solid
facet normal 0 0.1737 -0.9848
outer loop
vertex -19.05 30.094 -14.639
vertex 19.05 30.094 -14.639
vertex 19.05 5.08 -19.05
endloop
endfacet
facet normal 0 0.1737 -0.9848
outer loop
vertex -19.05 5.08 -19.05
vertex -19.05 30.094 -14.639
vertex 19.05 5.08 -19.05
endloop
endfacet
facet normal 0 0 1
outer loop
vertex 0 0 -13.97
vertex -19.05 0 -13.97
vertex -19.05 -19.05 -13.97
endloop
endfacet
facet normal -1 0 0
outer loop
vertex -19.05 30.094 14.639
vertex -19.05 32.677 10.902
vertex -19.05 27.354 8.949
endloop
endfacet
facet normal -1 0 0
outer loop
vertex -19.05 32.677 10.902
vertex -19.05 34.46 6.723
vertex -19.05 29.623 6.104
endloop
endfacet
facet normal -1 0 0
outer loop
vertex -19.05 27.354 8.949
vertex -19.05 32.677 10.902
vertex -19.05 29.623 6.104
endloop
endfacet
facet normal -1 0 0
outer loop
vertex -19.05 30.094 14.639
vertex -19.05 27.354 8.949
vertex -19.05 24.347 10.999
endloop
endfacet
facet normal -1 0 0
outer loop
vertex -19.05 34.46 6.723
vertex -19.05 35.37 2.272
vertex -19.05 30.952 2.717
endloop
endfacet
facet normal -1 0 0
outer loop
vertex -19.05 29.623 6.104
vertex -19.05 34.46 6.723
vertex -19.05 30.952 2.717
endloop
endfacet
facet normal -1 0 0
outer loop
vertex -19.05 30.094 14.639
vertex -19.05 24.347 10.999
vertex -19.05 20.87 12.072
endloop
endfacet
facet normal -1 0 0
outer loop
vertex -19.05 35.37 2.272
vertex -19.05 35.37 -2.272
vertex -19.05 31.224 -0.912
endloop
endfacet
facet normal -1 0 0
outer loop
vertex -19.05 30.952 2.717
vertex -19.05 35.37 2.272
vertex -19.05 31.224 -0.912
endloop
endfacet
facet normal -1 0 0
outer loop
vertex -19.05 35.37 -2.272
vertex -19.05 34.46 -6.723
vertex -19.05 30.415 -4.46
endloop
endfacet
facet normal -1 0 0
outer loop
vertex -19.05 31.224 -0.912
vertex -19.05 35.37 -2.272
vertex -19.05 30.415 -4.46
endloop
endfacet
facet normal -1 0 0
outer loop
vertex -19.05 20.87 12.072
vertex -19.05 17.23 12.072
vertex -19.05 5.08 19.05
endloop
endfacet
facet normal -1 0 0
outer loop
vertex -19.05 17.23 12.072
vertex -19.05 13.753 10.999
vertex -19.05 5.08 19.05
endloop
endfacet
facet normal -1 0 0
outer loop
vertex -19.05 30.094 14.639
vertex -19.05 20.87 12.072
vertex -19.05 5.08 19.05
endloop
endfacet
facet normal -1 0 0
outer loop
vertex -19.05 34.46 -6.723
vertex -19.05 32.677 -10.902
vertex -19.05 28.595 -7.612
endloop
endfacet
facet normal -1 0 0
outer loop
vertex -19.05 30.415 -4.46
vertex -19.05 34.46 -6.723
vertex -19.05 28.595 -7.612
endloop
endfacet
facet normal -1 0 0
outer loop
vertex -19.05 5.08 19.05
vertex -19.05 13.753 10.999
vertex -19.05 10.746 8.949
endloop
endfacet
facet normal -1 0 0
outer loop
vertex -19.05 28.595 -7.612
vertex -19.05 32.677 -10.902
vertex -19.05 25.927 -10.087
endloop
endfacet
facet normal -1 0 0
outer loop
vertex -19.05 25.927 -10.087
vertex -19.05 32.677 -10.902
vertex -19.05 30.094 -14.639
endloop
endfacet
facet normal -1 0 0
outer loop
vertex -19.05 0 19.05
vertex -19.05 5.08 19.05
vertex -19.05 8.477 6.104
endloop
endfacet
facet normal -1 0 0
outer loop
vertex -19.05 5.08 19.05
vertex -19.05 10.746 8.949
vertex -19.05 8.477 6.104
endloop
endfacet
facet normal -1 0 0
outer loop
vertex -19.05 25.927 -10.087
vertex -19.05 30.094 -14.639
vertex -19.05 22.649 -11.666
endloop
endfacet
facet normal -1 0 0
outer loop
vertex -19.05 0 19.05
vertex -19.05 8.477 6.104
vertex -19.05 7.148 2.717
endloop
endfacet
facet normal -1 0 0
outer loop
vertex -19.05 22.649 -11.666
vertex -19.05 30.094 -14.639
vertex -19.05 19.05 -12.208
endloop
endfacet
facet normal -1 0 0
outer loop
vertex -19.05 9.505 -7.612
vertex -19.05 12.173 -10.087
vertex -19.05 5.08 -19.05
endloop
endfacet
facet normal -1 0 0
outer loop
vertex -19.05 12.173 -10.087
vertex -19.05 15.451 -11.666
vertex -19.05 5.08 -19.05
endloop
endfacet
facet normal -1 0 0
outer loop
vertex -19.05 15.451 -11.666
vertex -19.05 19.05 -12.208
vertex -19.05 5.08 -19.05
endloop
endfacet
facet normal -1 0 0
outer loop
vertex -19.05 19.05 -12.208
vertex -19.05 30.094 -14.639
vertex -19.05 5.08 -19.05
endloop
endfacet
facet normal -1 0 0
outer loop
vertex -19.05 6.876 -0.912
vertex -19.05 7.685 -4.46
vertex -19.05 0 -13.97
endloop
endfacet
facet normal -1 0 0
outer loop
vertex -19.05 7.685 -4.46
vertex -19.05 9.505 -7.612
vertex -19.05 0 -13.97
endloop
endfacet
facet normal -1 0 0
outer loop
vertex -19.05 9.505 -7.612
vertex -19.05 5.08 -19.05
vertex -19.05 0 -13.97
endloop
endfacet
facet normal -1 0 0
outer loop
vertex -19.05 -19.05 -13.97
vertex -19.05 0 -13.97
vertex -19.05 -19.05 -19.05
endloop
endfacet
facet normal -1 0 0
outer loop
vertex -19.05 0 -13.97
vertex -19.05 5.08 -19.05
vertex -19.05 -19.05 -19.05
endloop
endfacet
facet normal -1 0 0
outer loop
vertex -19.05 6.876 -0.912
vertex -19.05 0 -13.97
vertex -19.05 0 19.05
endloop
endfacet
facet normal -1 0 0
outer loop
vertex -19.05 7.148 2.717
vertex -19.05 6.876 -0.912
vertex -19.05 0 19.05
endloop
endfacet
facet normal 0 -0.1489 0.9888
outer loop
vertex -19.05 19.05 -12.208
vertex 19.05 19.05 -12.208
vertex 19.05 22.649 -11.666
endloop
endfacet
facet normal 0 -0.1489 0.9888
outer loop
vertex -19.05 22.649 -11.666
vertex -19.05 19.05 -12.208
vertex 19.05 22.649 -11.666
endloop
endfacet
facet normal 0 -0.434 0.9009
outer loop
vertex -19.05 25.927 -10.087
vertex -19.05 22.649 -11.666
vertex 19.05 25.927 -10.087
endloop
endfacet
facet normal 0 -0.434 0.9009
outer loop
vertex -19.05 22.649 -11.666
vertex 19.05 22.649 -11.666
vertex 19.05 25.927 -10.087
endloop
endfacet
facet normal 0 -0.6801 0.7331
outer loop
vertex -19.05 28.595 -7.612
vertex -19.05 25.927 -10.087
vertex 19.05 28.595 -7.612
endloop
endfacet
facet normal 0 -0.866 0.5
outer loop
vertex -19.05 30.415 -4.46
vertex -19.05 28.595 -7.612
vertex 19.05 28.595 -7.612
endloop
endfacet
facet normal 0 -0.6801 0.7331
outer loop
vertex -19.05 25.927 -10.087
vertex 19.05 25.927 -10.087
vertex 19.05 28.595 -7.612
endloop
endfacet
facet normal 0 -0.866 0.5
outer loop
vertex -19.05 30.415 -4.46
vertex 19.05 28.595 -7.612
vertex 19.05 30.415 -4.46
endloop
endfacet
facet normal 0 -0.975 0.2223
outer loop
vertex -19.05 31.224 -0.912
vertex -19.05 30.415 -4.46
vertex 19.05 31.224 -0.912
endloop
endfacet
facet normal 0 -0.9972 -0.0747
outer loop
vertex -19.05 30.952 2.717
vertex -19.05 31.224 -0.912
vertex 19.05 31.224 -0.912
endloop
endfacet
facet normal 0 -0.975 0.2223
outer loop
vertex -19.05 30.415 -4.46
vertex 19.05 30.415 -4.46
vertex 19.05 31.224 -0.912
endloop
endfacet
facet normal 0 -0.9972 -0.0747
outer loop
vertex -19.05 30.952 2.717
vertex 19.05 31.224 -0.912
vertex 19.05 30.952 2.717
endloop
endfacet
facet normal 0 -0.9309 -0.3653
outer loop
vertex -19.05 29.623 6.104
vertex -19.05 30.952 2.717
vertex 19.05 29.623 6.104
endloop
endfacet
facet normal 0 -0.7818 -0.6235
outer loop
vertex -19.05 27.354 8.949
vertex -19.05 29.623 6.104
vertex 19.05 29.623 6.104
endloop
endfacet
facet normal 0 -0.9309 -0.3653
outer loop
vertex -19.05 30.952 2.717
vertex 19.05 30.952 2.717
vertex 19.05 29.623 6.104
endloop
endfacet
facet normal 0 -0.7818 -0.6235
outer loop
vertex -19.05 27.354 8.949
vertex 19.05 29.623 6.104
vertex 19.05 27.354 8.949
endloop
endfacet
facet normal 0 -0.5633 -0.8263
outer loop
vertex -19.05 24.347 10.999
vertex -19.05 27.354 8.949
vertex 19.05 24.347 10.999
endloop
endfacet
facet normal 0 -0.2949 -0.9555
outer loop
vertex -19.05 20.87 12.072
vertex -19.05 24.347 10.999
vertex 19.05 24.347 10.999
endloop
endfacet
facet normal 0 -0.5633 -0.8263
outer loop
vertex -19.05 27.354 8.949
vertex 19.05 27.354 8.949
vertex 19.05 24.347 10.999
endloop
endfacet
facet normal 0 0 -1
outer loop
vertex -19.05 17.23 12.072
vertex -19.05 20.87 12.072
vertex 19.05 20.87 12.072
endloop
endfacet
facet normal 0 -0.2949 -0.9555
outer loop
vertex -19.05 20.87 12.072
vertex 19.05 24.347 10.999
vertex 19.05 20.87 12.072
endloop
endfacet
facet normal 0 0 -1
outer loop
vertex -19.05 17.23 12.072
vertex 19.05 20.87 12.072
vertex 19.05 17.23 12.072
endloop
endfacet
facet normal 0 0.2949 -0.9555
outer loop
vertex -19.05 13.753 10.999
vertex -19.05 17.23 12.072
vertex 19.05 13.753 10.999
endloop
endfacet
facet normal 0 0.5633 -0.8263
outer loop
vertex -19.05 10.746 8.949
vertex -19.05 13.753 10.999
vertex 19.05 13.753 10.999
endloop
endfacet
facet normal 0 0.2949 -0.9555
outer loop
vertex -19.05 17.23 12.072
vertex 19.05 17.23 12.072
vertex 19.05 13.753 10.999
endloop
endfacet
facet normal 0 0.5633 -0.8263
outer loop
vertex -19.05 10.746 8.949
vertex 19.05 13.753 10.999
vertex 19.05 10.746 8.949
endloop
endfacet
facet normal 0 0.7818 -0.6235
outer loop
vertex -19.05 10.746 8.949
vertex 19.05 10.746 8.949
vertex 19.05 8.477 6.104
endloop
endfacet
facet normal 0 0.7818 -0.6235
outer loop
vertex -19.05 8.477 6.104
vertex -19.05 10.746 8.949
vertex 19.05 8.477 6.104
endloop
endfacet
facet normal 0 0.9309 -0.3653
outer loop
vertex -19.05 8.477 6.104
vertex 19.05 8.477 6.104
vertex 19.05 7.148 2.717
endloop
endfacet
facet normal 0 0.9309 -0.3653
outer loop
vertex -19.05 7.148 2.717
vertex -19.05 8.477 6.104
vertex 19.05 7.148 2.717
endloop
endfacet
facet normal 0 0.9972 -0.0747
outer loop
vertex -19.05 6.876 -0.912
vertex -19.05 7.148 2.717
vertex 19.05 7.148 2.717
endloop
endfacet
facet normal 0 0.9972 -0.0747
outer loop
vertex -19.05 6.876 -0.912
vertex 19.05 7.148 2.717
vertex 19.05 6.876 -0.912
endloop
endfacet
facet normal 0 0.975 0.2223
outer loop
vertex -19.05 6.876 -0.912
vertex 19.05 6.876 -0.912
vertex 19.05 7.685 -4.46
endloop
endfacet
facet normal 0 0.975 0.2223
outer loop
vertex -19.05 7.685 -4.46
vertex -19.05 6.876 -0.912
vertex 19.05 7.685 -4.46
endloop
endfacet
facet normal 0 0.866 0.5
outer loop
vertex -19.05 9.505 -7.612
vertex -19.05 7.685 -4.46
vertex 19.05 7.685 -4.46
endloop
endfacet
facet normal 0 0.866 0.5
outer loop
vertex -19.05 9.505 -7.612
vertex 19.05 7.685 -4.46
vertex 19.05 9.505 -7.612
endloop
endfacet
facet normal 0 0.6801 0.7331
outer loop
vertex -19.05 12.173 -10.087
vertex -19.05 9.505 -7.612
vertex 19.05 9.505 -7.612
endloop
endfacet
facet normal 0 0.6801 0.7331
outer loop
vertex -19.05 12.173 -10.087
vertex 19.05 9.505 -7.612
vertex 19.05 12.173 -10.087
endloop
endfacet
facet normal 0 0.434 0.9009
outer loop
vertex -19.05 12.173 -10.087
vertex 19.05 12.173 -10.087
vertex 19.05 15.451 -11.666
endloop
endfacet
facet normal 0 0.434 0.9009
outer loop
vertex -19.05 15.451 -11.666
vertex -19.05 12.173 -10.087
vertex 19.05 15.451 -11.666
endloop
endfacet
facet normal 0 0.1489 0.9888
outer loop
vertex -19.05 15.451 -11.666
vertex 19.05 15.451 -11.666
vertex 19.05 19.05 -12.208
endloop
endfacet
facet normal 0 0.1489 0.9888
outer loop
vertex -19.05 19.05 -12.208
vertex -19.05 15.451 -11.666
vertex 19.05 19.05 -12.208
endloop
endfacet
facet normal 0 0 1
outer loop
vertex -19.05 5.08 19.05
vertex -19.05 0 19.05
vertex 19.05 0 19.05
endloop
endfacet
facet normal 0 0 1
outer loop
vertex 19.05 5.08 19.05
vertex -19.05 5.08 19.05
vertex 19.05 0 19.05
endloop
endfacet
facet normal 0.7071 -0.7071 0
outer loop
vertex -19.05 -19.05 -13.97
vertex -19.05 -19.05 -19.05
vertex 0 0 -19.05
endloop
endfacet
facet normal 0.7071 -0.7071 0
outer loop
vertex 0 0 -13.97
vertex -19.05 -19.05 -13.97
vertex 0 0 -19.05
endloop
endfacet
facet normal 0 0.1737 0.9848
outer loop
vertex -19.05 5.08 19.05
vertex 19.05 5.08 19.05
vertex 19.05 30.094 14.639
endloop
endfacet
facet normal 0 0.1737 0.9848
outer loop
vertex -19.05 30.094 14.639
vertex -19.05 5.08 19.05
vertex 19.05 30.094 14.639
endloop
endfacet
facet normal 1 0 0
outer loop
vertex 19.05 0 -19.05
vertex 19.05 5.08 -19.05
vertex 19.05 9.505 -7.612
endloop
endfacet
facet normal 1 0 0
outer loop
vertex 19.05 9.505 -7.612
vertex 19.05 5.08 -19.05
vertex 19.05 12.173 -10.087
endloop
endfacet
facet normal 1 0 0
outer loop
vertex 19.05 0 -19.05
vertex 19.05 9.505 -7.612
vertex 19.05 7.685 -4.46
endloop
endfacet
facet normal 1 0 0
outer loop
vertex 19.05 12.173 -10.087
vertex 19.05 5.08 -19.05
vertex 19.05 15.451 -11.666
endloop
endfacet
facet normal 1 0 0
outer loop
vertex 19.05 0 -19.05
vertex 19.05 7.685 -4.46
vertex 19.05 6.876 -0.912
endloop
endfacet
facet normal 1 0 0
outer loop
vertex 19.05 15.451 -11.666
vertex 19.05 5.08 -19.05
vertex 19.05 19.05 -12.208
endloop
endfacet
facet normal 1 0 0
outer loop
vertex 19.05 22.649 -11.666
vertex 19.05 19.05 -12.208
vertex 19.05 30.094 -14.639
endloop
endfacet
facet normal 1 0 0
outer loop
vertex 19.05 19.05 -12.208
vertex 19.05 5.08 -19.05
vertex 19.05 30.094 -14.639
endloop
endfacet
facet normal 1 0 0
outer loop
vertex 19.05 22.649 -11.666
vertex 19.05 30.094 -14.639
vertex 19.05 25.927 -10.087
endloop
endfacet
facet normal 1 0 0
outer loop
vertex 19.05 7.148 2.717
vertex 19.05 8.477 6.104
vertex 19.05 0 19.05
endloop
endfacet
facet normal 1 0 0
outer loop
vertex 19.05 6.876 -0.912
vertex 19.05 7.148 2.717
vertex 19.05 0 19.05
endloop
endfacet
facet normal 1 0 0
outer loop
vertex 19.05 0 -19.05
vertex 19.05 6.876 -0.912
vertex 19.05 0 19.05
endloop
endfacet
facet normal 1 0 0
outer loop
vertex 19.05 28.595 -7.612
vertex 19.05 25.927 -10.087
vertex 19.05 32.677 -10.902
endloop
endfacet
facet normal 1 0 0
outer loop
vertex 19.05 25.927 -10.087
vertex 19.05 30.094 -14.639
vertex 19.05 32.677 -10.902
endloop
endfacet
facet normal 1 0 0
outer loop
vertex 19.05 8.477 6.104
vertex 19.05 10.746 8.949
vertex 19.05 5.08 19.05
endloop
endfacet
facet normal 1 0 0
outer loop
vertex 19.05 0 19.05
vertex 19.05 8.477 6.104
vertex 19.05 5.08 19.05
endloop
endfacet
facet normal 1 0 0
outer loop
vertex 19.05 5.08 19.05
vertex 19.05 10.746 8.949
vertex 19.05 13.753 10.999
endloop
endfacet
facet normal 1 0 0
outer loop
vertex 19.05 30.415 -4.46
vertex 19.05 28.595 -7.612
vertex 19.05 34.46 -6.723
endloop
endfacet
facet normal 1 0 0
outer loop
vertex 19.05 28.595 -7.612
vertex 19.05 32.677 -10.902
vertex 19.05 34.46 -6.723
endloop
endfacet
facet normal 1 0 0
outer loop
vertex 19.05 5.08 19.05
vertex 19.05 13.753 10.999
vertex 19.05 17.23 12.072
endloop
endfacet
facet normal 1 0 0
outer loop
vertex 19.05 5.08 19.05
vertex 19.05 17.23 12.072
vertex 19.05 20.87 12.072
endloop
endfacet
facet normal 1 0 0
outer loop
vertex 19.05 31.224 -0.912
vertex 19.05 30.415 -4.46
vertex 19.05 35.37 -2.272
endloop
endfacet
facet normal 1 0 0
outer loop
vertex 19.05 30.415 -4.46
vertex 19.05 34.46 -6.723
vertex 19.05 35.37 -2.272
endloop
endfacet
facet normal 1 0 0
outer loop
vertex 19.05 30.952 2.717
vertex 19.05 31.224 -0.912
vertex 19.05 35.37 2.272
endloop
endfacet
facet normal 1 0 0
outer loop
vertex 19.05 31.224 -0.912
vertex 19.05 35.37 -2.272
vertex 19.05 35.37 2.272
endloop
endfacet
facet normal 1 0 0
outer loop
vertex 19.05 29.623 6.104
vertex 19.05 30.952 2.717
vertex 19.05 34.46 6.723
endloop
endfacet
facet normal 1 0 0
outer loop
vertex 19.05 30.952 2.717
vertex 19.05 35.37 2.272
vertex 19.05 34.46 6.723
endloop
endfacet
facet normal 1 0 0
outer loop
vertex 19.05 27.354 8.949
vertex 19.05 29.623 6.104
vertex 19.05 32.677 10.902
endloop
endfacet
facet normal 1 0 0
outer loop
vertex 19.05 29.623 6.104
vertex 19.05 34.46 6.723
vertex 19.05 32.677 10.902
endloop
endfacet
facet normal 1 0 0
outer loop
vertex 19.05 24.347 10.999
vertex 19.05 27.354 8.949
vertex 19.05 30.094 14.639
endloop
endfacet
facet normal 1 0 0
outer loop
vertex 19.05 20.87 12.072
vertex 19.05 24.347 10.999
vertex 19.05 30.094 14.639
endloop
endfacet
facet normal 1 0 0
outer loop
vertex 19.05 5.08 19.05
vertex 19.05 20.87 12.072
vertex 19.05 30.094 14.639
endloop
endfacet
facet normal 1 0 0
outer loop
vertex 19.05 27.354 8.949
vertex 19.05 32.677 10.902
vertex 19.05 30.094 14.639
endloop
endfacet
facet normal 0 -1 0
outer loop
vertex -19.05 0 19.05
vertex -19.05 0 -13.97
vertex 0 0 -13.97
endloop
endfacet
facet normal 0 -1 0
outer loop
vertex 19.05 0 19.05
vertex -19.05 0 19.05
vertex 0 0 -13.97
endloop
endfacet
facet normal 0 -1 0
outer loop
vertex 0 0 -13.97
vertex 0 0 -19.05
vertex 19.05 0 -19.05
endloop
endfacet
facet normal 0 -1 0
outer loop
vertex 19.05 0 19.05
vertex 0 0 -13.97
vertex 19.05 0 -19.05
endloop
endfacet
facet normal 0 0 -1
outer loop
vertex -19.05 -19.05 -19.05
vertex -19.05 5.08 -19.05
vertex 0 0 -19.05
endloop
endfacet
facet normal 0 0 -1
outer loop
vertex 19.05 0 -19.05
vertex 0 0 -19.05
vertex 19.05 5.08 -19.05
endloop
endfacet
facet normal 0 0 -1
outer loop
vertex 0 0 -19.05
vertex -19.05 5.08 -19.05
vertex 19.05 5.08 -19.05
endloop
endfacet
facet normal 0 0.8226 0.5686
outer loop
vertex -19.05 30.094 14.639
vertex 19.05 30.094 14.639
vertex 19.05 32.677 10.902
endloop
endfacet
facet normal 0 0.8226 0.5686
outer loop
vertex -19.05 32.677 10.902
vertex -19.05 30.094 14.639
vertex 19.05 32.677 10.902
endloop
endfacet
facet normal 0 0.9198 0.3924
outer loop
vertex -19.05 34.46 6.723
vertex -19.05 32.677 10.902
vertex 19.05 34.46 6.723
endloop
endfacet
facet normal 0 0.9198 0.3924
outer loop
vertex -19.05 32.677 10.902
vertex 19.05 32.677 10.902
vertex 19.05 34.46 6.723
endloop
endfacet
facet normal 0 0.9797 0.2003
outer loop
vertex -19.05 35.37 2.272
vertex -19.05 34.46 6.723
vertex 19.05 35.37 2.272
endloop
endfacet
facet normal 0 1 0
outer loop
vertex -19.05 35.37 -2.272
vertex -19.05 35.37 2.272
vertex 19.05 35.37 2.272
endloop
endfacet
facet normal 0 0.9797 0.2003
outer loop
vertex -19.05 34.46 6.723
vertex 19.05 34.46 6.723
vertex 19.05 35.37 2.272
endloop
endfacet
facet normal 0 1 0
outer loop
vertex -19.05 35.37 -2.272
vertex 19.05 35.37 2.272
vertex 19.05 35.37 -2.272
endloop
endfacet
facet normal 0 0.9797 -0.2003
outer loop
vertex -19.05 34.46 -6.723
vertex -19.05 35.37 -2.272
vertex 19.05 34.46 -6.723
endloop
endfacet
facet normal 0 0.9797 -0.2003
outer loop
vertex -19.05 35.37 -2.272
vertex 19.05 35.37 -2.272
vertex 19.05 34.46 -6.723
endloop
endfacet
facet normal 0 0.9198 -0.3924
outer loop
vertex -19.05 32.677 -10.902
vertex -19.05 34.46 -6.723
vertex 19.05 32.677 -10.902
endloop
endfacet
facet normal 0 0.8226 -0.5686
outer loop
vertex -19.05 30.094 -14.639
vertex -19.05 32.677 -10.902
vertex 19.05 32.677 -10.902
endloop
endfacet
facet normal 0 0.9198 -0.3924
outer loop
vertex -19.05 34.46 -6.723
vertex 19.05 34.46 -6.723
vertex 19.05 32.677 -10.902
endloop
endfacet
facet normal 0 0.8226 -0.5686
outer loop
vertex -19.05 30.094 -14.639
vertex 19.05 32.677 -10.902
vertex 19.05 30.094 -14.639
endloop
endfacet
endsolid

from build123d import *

# Parameters (mm, degrees)
SKETCH2_W           = 38.1
SKETCH2_H           = 38.1
BOSS_EXTRUDE1_DEPTH = 5.08
BOSS_EXTRUDE3_DEPTH = 38.1
SKETCH5_R           = 12.2084592
CUT_EXTRUDE1_DEPTH  = 39.1
BOSS_EXTRUDE4_DEPTH = 5.08


with BuildPart() as part:
    # Sketch2 → Boss-Extrude1 (new body)
    with BuildSketch(Plane(origin=(0, 0, 0), x_dir=(1, 0, 0), z_dir=(0, 1, 0))):
        Rectangle(SKETCH2_W, SKETCH2_H)
    extrude(amount=BOSS_EXTRUDE1_DEPTH)

    # Sketch3 → Boss-Extrude3 (add, through all)
    with BuildSketch(Plane(origin=(19.05, 0, 0), x_dir=(0, 0, -1), z_dir=(1, 0, 0))):
        with BuildLine():
            Line((-19.05, 5.08), (-14.639336287, 30.094116927))
            ThreePointArc((-14.639336287, 30.094116927), (0, 35.484404044), (14.639336287, 30.094116927))
            Line((14.639336287, 30.094116927), (19.05, 5.08))
            Line((19.05, 5.08), (-19.05, 5.08))
        make_face()
    extrude(amount=-BOSS_EXTRUDE3_DEPTH)

    # Sketch5 → Cut-Extrude1 (cut, through all)
    with BuildSketch(Plane(origin=(19.05, 0, 0), x_dir=(0, 0, -1), z_dir=(1, 0, 0))):
        with Locations((0, 19.05)):
            Circle(SKETCH5_R)
    extrude(amount=-CUT_EXTRUDE1_DEPTH, mode=Mode.SUBTRACT)

    # Sketch6 → Boss-Extrude4 (add)
    with BuildSketch(Plane(origin=(0, 0, -19.05), x_dir=(-1, 0, 0), z_dir=(0, 0, -1))):
        Polygon((19.05, 0), (19.05, -19.05), (0, 0), align=None)
    extrude(amount=-BOSS_EXTRUDE4_DEPTH)


solid = part.part
